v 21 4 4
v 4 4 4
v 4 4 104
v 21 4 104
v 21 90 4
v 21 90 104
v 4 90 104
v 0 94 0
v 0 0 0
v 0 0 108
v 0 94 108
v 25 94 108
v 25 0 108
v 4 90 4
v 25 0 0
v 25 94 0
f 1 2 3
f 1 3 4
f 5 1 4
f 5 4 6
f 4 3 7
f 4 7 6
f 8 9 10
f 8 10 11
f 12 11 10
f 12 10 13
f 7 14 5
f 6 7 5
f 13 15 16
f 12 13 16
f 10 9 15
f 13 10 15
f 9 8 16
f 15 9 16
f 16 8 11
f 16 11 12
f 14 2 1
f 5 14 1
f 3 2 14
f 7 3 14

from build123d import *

# Parameters (mm, degrees)
SKETCH_1_W      = 25
SKETCH_1_H      = 94
EXTRUDE_1_DEPTH = 108
SHELL_2_T       = 4


with BuildPart() as part:
    # 草图1 → 凸台-拉伸1 (new body)
    with BuildSketch(Plane.XY):
        with Locations((12.5, 47)):
            Rectangle(SKETCH_1_W, SKETCH_1_H)
    extrude(amount=EXTRUDE_1_DEPTH)

    # 抽壳2 (no face opened: a closed hollow body)
    add(offset(amount=-SHELL_2_T, mode=Mode.PRIVATE), mode=Mode.SUBTRACT)


solid = part.part
